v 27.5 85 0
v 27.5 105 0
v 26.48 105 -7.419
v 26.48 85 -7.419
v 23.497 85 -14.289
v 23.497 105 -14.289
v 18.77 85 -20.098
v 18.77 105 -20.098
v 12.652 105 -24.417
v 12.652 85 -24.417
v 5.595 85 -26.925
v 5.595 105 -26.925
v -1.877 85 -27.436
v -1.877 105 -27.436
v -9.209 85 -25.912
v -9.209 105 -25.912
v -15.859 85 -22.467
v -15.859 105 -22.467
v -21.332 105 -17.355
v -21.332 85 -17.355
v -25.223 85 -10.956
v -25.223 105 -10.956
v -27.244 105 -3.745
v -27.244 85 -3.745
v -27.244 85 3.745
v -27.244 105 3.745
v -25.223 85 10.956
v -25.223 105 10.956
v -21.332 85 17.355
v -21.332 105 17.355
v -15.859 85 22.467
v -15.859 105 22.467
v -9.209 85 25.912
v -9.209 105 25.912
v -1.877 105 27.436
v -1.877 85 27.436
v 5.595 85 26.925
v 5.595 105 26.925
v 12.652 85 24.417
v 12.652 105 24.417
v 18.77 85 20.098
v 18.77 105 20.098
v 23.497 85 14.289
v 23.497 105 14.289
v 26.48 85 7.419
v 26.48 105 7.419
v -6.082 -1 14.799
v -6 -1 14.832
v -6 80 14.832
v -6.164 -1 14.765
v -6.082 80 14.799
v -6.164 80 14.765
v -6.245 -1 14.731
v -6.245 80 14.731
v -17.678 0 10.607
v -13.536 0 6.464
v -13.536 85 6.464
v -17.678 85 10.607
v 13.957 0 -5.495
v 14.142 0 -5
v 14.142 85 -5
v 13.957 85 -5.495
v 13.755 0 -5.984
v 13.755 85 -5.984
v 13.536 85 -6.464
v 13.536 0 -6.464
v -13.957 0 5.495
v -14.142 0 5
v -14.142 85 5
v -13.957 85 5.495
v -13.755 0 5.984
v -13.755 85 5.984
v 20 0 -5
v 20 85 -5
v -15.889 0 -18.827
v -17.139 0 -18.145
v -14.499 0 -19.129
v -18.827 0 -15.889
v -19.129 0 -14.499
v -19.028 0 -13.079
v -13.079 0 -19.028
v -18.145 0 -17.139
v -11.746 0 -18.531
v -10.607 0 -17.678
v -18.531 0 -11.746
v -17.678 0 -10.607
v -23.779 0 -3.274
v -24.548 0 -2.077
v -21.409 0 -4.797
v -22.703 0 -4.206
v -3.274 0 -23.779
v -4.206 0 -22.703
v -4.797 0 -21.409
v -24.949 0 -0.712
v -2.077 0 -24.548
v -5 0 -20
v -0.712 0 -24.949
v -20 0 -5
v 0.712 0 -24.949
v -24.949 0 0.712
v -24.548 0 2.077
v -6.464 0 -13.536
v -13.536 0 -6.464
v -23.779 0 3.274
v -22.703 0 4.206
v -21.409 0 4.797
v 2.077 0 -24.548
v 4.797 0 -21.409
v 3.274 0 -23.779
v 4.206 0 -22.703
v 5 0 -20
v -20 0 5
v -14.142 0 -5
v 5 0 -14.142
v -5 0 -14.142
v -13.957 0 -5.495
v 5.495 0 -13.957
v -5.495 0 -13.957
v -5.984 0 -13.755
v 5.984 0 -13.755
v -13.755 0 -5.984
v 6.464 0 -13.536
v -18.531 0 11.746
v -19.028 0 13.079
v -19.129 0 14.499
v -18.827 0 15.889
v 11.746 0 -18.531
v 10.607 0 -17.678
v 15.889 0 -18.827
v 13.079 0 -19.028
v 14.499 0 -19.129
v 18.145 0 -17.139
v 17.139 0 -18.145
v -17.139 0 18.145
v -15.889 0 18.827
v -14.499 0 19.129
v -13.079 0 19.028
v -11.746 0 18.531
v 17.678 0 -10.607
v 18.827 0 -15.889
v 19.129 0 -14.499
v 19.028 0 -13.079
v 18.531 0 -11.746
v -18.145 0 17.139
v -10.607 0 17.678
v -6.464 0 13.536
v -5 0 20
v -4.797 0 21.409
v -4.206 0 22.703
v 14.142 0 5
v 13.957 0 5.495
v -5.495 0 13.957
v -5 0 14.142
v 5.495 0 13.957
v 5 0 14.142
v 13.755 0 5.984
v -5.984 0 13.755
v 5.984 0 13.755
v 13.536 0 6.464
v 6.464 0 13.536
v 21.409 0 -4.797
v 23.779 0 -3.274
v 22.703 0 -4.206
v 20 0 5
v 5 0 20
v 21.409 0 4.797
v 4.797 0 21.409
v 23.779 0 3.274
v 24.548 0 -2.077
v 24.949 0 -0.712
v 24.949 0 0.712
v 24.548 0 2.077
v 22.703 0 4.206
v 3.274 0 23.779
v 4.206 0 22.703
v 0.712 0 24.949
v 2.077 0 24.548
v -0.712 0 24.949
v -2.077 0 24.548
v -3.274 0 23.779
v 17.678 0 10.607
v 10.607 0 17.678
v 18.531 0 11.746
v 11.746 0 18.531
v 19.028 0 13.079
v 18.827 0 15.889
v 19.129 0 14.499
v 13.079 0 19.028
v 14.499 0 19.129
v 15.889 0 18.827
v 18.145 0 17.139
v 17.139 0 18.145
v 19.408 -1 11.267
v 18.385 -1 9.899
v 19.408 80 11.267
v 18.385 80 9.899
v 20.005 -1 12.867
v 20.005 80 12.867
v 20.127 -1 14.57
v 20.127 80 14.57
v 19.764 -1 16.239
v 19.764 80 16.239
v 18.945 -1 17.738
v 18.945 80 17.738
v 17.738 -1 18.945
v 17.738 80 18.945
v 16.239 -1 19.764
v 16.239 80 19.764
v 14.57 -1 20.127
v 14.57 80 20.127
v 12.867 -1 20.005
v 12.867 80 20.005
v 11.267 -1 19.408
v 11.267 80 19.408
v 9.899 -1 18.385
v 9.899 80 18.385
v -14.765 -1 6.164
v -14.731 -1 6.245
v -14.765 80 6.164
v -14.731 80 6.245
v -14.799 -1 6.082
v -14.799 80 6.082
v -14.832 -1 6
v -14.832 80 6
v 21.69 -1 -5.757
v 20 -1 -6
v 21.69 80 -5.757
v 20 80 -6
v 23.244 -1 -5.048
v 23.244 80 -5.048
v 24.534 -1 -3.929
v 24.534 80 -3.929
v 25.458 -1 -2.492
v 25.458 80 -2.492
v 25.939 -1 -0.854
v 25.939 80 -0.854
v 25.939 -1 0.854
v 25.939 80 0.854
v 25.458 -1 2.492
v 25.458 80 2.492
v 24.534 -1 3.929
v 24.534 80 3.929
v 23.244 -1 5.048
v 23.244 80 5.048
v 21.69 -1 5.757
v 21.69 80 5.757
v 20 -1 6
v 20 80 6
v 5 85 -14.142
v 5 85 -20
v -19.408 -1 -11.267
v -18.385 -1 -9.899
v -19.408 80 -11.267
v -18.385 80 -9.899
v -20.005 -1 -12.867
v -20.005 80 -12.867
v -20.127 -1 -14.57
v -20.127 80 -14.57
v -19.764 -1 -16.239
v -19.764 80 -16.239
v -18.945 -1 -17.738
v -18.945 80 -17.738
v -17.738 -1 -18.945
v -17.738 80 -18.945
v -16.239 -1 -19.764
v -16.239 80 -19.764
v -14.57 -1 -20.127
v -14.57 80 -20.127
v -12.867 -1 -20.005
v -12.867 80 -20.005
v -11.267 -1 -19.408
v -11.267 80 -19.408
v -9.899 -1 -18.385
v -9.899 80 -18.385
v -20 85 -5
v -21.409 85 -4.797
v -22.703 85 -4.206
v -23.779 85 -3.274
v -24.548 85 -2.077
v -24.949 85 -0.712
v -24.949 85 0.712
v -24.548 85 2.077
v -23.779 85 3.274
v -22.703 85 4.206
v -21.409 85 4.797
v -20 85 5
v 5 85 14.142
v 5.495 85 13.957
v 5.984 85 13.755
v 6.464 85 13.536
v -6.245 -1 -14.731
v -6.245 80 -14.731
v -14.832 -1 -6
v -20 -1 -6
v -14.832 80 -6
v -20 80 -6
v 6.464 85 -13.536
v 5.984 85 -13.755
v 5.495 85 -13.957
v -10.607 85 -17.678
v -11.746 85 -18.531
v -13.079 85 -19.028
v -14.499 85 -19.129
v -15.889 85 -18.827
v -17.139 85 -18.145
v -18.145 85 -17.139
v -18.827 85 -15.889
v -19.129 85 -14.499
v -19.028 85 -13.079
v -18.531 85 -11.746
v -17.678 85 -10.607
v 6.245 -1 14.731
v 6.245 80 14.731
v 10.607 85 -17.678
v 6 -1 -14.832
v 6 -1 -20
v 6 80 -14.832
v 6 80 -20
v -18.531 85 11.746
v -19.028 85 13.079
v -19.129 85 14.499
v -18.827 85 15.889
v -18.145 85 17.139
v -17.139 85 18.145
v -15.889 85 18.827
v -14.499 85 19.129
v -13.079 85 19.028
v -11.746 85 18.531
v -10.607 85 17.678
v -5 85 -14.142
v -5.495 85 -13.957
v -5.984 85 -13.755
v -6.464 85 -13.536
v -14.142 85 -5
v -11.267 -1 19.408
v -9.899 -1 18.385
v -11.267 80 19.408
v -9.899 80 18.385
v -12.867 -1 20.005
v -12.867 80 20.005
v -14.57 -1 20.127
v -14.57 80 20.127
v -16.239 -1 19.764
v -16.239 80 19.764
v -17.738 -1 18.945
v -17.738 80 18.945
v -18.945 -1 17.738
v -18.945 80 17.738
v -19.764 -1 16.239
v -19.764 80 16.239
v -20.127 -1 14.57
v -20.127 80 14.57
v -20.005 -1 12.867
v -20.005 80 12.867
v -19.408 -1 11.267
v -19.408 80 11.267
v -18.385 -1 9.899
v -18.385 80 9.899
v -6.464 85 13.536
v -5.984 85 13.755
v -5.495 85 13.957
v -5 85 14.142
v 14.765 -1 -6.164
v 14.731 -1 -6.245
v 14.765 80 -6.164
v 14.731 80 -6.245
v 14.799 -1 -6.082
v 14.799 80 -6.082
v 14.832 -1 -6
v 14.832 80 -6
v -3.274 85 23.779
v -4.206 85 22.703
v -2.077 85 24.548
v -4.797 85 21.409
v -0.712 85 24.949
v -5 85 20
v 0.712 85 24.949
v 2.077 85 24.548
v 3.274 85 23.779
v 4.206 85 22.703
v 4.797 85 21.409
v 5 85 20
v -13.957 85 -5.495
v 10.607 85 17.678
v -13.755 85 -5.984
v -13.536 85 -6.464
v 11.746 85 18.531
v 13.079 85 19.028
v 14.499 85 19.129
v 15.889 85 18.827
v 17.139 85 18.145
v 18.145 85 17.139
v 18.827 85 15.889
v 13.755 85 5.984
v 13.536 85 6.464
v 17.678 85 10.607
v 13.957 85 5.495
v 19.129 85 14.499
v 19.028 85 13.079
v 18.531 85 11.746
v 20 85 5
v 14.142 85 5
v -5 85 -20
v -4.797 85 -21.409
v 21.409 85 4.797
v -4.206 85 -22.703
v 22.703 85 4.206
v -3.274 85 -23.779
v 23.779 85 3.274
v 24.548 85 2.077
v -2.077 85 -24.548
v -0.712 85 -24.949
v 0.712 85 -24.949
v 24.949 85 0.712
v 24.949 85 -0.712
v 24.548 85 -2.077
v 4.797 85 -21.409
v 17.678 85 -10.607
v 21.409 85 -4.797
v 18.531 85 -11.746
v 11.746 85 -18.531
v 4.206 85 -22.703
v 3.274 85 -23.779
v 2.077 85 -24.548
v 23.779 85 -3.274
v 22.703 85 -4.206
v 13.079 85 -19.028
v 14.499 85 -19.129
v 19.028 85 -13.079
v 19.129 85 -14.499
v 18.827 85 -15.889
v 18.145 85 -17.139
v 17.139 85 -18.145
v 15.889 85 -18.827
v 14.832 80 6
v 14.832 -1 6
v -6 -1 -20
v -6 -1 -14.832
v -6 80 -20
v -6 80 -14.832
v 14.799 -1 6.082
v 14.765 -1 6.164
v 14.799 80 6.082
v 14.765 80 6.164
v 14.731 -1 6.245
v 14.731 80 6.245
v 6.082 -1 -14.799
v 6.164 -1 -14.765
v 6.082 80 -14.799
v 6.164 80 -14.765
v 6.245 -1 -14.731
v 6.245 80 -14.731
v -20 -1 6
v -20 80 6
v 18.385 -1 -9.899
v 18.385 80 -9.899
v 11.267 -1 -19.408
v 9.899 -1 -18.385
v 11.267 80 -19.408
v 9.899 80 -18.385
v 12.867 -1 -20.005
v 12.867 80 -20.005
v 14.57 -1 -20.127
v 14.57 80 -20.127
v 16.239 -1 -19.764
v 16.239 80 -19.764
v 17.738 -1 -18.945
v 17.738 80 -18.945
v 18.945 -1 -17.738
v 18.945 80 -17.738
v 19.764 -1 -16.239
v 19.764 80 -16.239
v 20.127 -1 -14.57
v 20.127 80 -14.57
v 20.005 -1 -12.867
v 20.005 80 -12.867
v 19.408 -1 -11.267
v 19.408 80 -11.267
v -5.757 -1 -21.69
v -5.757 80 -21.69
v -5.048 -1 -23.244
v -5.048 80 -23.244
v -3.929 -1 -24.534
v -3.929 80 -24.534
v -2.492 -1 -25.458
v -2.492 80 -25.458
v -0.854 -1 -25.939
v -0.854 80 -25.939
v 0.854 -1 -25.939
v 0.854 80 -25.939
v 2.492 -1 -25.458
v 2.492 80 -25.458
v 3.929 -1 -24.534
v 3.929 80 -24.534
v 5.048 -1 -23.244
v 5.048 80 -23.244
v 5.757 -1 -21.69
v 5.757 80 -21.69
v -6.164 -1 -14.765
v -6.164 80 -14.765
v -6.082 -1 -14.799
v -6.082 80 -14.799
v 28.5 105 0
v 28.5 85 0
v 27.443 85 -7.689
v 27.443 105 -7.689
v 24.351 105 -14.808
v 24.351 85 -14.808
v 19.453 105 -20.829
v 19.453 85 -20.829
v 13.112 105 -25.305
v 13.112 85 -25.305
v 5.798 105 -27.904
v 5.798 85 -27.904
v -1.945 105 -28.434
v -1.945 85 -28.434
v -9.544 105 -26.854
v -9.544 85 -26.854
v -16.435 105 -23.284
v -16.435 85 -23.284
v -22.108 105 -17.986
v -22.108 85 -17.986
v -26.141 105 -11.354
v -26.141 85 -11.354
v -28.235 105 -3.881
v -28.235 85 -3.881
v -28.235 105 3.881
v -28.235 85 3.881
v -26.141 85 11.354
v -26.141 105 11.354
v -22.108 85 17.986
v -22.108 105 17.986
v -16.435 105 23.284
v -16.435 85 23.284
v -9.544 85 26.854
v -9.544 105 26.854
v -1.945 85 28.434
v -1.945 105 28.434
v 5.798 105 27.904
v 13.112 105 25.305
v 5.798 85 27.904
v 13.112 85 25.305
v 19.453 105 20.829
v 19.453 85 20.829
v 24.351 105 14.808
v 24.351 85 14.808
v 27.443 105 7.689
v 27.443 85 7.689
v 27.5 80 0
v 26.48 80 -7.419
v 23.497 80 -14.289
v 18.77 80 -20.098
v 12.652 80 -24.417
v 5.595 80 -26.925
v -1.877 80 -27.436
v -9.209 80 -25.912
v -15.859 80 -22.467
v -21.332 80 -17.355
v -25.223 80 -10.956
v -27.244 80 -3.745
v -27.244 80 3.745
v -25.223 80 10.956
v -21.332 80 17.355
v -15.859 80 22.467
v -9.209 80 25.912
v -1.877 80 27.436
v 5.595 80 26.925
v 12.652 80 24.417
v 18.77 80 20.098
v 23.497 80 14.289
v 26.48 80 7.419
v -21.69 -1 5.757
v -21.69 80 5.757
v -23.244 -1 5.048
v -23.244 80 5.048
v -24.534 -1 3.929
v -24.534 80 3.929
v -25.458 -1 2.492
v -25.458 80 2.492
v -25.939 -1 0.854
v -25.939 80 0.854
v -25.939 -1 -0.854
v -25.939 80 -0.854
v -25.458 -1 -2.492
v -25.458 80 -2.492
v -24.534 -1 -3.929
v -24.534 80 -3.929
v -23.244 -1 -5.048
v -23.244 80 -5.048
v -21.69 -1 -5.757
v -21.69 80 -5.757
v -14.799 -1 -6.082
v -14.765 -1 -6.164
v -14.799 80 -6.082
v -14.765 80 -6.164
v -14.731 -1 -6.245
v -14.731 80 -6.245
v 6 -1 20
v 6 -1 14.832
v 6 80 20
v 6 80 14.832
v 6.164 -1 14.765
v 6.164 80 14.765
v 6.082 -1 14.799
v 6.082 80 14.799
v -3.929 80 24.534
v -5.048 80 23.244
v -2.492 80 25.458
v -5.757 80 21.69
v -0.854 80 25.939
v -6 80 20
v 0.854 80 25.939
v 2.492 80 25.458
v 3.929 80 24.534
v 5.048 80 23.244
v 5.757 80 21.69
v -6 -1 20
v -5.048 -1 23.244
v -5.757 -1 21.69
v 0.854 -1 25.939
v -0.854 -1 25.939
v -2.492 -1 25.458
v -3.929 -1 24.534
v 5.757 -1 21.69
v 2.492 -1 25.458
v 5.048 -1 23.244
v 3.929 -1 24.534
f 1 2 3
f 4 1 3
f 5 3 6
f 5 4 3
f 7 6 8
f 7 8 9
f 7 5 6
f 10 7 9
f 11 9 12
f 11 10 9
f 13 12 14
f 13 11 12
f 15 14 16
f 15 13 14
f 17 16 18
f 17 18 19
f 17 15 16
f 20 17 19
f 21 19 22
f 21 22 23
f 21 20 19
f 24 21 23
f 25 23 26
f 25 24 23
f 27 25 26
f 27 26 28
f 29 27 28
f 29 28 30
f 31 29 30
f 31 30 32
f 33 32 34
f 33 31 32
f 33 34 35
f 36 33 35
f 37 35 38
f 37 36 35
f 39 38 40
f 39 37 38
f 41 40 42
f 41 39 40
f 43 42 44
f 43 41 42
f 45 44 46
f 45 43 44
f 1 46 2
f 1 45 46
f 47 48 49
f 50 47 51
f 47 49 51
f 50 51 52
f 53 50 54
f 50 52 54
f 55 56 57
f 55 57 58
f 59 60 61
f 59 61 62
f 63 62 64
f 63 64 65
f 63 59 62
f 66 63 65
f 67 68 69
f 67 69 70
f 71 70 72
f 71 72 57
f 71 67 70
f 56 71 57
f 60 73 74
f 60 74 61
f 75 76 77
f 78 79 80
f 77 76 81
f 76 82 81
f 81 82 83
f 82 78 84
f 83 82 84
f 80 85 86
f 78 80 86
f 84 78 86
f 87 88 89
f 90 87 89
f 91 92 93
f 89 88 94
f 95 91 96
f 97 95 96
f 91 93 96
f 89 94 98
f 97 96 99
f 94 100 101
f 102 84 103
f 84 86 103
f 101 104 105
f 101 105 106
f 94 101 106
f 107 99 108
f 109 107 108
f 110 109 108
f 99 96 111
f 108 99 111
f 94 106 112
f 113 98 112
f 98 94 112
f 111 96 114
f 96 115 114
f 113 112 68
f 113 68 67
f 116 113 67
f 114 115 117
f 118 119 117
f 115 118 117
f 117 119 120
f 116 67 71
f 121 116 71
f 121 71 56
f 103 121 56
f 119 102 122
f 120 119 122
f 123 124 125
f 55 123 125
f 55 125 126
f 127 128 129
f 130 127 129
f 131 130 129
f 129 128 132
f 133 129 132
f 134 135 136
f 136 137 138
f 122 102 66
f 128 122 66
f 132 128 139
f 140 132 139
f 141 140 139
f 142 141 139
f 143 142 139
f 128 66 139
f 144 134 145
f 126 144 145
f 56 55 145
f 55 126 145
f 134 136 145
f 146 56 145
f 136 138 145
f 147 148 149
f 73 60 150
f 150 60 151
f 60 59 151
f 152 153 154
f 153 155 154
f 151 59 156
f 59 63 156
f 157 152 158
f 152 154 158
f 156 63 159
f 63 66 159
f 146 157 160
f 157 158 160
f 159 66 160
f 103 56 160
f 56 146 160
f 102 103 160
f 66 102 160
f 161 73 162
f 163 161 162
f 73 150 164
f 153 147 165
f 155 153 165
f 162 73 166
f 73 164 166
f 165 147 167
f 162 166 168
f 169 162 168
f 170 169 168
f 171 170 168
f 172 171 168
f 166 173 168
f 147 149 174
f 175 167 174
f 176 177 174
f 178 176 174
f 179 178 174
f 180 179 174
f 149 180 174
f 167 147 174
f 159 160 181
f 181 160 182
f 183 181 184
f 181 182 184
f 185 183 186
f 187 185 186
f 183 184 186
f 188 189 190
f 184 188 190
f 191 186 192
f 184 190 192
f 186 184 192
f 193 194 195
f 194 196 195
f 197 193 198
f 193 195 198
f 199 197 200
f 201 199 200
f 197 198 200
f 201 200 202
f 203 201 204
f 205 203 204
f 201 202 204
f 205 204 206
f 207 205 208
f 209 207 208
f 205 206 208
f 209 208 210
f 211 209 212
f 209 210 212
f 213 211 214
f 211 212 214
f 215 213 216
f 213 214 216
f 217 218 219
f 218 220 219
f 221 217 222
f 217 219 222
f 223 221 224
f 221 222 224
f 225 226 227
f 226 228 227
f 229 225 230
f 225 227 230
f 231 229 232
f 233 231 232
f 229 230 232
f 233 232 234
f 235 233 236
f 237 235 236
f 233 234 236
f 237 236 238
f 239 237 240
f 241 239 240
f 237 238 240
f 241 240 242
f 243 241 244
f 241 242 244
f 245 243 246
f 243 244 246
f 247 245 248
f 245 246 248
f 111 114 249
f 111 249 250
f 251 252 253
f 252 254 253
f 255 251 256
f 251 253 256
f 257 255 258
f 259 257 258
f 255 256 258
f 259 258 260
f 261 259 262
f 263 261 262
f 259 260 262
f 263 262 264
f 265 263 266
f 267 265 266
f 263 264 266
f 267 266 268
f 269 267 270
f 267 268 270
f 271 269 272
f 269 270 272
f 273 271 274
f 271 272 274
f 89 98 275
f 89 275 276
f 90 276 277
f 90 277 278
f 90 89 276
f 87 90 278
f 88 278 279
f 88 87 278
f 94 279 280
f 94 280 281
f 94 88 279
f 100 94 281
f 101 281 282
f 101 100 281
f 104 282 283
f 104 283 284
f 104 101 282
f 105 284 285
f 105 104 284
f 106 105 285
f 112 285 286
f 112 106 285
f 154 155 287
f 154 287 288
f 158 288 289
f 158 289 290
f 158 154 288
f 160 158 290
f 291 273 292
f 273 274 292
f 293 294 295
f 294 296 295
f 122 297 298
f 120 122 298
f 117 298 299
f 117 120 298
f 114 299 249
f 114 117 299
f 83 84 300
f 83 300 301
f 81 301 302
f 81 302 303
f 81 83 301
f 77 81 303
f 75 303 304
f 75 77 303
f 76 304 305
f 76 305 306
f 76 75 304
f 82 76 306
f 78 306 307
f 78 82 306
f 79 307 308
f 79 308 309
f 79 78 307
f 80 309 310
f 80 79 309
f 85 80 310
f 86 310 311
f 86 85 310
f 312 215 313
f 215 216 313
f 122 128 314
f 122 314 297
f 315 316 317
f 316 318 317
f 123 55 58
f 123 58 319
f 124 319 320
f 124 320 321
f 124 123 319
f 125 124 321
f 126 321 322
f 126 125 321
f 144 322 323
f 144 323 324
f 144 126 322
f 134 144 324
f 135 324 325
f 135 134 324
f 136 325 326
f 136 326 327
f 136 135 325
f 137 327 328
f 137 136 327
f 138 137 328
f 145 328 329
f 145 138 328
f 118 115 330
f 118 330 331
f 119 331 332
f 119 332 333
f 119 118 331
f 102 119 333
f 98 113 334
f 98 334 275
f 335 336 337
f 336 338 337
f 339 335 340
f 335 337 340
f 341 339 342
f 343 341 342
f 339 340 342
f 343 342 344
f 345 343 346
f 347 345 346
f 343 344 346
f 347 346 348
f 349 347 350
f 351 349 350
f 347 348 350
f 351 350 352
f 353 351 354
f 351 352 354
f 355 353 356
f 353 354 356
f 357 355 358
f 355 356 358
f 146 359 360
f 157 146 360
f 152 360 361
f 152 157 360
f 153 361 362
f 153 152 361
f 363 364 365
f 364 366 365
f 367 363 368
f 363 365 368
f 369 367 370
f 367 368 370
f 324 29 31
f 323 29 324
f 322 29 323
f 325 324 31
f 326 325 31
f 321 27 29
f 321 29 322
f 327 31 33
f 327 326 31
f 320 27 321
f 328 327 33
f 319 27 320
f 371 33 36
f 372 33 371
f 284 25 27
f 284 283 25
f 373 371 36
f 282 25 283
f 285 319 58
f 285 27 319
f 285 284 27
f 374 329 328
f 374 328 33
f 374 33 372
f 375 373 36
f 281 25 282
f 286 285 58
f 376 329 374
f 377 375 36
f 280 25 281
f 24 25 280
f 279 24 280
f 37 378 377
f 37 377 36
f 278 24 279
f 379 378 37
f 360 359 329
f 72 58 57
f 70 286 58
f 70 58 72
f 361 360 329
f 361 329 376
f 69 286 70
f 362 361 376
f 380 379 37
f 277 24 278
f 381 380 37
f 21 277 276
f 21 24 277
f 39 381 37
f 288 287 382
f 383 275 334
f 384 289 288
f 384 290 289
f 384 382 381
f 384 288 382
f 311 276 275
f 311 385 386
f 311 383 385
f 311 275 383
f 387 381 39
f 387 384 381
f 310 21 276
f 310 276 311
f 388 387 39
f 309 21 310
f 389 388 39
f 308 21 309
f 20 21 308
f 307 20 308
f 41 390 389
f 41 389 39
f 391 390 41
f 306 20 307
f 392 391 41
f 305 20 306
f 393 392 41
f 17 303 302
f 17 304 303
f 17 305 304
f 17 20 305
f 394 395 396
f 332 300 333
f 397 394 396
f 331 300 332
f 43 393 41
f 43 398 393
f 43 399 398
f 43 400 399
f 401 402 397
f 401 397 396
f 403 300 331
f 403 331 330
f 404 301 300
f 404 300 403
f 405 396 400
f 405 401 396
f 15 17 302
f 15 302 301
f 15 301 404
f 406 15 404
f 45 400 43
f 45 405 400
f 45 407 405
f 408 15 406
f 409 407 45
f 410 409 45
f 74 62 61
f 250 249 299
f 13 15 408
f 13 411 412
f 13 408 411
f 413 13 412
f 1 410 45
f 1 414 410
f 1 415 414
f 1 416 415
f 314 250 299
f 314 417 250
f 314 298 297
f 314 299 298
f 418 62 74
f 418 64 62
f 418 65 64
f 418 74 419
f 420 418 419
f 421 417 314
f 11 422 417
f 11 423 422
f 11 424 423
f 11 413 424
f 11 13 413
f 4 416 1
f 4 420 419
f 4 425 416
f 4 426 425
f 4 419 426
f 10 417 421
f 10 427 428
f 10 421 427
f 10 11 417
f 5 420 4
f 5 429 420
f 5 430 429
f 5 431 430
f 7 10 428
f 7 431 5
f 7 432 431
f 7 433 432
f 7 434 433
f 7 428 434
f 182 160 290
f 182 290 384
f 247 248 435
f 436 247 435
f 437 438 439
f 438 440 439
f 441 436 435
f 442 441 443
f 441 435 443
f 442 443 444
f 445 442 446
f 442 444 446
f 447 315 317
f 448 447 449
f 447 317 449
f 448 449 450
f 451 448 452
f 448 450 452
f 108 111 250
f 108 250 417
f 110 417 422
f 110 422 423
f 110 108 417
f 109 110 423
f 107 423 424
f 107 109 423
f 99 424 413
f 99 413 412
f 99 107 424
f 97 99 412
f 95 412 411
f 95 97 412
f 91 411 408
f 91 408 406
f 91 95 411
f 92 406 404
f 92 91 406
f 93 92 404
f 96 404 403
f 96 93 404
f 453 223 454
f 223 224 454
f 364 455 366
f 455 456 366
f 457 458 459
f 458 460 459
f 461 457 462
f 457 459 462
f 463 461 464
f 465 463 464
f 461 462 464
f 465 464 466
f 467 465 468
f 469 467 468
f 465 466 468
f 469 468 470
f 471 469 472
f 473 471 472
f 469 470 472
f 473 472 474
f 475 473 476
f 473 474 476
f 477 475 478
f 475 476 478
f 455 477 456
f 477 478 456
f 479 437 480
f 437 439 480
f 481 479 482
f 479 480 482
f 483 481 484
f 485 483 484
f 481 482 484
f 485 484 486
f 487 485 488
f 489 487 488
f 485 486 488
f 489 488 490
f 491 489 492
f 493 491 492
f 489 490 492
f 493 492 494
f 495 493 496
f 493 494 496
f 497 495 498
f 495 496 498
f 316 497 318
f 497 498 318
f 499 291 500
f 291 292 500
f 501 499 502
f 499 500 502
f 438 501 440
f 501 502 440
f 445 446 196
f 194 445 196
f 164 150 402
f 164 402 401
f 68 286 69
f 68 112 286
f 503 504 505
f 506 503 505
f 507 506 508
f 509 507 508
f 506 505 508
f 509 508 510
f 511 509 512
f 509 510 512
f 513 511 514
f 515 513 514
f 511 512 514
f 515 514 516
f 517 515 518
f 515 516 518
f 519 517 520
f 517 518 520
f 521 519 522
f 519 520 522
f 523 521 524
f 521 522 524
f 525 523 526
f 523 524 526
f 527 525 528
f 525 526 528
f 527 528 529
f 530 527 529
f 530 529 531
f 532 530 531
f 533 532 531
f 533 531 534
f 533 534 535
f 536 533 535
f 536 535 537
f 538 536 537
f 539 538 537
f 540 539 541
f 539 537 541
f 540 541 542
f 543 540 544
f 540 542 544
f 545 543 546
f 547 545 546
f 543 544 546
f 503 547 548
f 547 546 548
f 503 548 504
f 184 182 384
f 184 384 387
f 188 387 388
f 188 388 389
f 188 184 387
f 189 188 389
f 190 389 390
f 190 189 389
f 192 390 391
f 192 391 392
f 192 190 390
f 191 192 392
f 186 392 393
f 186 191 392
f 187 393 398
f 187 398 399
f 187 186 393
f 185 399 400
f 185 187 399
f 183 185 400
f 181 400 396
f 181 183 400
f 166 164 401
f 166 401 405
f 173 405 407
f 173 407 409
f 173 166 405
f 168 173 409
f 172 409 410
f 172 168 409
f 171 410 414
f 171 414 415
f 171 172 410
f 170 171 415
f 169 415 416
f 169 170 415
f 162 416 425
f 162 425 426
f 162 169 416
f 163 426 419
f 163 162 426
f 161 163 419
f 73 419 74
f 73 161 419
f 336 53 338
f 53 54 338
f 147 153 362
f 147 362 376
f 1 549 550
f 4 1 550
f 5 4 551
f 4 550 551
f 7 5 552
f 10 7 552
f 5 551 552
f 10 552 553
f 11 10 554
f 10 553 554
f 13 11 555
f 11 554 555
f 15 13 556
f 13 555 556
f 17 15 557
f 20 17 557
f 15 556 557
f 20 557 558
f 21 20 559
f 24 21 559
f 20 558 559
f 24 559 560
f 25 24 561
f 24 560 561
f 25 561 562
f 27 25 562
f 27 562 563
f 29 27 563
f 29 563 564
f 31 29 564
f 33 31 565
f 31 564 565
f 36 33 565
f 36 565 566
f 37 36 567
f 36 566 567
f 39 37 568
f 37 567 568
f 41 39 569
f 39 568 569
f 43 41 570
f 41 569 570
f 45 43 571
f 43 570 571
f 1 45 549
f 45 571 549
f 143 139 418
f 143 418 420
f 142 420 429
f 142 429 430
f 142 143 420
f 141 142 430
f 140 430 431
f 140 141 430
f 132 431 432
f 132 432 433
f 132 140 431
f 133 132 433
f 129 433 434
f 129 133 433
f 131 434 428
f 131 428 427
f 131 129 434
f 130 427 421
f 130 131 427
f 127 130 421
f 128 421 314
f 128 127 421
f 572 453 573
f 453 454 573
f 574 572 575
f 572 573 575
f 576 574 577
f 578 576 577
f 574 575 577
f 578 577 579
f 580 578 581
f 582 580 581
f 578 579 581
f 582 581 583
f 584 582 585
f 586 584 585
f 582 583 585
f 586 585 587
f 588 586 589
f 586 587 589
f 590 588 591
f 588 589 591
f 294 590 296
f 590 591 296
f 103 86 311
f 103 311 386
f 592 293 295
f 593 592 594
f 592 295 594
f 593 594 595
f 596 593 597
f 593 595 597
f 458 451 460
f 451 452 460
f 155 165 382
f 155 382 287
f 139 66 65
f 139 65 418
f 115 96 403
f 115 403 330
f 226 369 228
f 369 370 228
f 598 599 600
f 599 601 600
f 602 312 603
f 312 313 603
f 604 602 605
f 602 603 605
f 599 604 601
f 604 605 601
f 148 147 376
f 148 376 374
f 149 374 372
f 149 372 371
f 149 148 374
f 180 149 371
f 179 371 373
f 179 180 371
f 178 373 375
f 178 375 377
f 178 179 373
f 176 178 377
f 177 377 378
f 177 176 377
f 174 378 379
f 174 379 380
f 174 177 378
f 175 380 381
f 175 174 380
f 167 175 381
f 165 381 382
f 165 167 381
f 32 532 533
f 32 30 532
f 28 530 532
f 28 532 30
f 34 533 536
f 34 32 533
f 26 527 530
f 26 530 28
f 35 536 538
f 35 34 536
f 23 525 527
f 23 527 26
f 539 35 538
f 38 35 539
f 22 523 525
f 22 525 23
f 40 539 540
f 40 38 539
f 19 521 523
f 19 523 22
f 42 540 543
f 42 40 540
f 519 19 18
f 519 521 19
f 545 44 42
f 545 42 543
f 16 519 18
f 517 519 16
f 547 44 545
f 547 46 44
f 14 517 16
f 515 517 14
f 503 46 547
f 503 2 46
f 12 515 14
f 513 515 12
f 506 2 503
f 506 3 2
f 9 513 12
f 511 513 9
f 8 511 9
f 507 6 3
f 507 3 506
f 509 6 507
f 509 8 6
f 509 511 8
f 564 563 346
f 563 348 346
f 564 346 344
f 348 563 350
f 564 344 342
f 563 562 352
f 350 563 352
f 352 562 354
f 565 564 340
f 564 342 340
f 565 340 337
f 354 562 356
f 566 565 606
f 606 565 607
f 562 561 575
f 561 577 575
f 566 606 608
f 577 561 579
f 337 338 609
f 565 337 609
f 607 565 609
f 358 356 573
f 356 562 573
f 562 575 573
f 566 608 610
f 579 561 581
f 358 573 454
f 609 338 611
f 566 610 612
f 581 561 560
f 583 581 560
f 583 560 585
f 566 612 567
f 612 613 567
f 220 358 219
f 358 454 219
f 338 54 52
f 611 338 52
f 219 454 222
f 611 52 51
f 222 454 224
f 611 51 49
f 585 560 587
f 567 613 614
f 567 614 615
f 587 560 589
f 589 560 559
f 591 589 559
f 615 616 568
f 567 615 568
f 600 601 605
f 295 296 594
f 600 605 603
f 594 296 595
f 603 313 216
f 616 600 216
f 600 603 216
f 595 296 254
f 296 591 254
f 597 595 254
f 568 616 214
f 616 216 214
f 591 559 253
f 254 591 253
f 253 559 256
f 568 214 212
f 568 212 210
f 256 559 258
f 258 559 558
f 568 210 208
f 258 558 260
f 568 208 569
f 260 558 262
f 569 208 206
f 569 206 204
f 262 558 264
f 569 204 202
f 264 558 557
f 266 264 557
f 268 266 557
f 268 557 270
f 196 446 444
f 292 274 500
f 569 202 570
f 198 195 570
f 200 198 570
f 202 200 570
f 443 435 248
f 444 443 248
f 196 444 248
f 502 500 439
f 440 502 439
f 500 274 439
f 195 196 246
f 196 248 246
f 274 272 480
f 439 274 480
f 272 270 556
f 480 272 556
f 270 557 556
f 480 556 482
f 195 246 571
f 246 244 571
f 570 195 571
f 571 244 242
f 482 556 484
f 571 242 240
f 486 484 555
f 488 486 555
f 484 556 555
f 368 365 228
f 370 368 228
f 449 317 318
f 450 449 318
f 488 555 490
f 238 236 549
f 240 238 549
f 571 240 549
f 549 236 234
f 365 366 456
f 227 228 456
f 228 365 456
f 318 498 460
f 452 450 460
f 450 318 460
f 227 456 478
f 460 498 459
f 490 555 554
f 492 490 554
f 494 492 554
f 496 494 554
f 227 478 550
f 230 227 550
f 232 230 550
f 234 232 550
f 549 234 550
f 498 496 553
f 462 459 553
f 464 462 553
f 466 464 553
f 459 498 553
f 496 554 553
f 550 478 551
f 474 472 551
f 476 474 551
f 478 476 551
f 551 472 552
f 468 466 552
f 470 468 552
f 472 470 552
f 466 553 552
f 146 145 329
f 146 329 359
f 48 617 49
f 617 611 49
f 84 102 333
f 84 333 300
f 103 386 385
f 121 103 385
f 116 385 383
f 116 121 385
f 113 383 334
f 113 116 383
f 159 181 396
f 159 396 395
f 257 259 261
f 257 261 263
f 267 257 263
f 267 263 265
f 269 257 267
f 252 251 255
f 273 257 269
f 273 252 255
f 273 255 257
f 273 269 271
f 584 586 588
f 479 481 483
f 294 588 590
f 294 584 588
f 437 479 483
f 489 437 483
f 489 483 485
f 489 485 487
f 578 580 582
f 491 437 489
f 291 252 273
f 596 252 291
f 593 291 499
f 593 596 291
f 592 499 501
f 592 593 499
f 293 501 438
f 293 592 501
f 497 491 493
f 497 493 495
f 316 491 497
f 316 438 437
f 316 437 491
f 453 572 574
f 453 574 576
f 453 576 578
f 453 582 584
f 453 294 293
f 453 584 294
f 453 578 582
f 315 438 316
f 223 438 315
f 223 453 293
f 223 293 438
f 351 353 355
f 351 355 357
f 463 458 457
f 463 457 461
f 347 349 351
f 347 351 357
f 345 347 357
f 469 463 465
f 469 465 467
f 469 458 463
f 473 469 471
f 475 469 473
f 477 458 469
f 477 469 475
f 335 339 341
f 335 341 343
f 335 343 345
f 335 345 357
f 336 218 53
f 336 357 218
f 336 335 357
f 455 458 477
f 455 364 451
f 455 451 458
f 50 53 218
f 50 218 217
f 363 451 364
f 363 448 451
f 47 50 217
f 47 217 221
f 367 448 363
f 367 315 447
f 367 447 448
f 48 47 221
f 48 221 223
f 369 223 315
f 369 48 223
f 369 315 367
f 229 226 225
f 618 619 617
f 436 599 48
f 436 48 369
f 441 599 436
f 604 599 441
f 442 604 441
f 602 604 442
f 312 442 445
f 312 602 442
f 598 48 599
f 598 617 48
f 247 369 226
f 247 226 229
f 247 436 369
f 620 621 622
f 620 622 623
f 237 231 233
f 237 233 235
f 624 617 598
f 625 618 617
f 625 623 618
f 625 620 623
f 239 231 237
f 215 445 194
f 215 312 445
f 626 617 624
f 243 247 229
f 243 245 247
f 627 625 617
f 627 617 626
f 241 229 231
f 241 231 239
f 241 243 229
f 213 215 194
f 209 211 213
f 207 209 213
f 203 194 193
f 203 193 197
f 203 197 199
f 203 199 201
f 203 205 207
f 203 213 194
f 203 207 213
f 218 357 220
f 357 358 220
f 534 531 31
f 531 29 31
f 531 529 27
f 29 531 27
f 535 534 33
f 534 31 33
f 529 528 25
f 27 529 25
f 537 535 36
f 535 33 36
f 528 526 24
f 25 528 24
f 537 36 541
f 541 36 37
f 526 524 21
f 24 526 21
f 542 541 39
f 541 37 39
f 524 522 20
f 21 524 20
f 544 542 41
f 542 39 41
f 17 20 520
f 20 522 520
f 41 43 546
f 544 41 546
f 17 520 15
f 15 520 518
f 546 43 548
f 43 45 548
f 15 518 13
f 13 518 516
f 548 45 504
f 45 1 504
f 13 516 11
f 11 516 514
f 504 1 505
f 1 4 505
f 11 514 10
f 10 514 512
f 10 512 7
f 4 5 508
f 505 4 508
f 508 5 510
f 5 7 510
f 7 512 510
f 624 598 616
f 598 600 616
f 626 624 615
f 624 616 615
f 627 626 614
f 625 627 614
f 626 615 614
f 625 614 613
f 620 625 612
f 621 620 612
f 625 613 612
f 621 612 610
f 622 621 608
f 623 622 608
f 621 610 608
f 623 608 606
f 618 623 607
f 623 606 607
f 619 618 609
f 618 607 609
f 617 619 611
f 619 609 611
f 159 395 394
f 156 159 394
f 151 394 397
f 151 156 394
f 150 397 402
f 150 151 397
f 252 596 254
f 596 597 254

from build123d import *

# Parameters (mm, degrees)
EXTRUDE_THIN1_DEPTH = 80
BOSS_EXTRUDE1_DEPTH = 1
SKETCH3_R           = 27.5
BOSS_EXTRUDE2_DEPTH = 5
SKETCH4_R           = 28.5
SKETCH4_R_2         = 27.5
EXTRUDE_THIN2_DEPTH = 20


with BuildPart() as part:
    # Sketch1 → Extrude-Thin1 (new body)
    with BuildSketch(Plane(origin=(0, 0, 0), x_dir=(1, 0, 0), z_dir=(0, 1, 0))):
        with BuildLine():
            Line((-6.245447795, -14.730729169), (-9.899494937, -18.384776311))
            ThreePointArc((-9.899494937, -18.384776311), (-18.384776311, -18.384776311), (-18.384776311, -9.899494937))
            Line((-18.384776311, -9.899494937), (-14.730729169, -6.245447795))
            ThreePointArc((-14.730729169, -6.245447795), (-14.78207252, -6.122934918), (-14.832396974, -6))
            Line((-14.832396974, -6), (-20, -6))
            ThreePointArc((-20, -6), (-26, 0), (-20, 6))
            Line((-20, 6), (-14.832396974, 6))
            ThreePointArc((-14.832396974, 6), (-14.78207252, 6.122934918), (-14.730729169, 6.245447795))
            Line((-14.730729169, 6.245447795), (-18.384776311, 9.899494937))
            ThreePointArc((-18.384776311, 9.899494937), (-18.384776311, 18.384776311), (-9.899494937, 18.384776311))
            Line((-9.899494937, 18.384776311), (-6.245447795, 14.730729169))
            ThreePointArc((-6.245447795, 14.730729169), (-6.122934918, 14.78207252), (-6, 14.832396974))
            Line((-6, 14.832396974), (-6, 20))
            ThreePointArc((-6, 20), (0, 26), (6, 20))
            Line((6, 20), (6, 14.832396974))
            ThreePointArc((6, 14.832396974), (6.122934918, 14.78207252), (6.245447795, 14.730729169))
            Line((6.245447795, 14.730729169), (9.899494937, 18.384776311))
            ThreePointArc((9.899494937, 18.384776311), (18.384776311, 18.384776311), (18.384776311, 9.899494937))
            Line((18.384776311, 9.899494937), (14.730729169, 6.245447795))
            ThreePointArc((14.730729169, 6.245447795), (14.78207252, 6.122934918), (14.832396974, 6))
            Line((14.832396974, 6), (20, 6))
            ThreePointArc((20, 6), (26, 0), (20, -6))
            Line((20, -6), (14.832396974, -6))
            ThreePointArc((14.832396974, -6), (14.78207252, -6.122934918), (14.730729169, -6.245447795))
            Line((14.730729169, -6.245447795), (18.384776311, -9.899494937))
            ThreePointArc((18.384776311, -9.899494937), (18.384776311, -18.384776311), (9.899494937, -18.384776311))
            Line((9.899494937, -18.384776311), (6.245447795, -14.730729169))
            ThreePointArc((6.245447795, -14.730729169), (6.122934918, -14.78207252), (6, -14.832396974))
            Line((6, -14.832396974), (6, -20))
            ThreePointArc((6, -20), (0, -26), (-6, -20))
            Line((-6, -20), (-6, -14.832396974))
            ThreePointArc((-6, -14.832396974), (-6.122934918, -14.78207252), (-6.245447795, -14.730729169))
        make_face()
        with BuildLine():
            Line((-6.464466094, -13.535533906), (-10.606601718, -17.67766953))
            ThreePointArc((-10.606601718, -17.67766953), (-17.67766953, -17.67766953), (-17.67766953, -10.606601718))
            Line((-17.67766953, -10.606601718), (-13.535533906, -6.464466094))
            ThreePointArc((-13.535533906, -6.464466094), (-13.858192988, -5.740251485), (-14.142135624, -5))
            Line((-14.142135624, -5), (-20, -5))
            ThreePointArc((-20, -5), (-25, 0), (-20, 5))
            Line((-20, 5), (-14.142135624, 5))
            ThreePointArc((-14.142135624, 5), (-13.858192988, 5.740251485), (-13.535533906, 6.464466094))
            Line((-13.535533906, 6.464466094), (-17.67766953, 10.606601718))
            ThreePointArc((-17.67766953, 10.606601718), (-17.67766953, 17.67766953), (-10.606601718, 17.67766953))
            Line((-10.606601718, 17.67766953), (-6.464466094, 13.535533906))
            ThreePointArc((-6.464466094, 13.535533906), (-5.740251485, 13.858192988), (-5, 14.142135624))
            Line((-5, 14.142135624), (-5, 20))
            ThreePointArc((-5, 20), (0, 25), (5, 20))
            Line((5, 20), (5, 14.142135624))
            ThreePointArc((5, 14.142135624), (5.740251485, 13.858192988), (6.464466094, 13.535533906))
            Line((6.464466094, 13.535533906), (10.606601718, 17.67766953))
            ThreePointArc((10.606601718, 17.67766953), (17.67766953, 17.67766953), (17.67766953, 10.606601718))
            Line((17.67766953, 10.606601718), (13.535533906, 6.464466094))
            ThreePointArc((13.535533906, 6.464466094), (13.858192988, 5.740251485), (14.142135624, 5))
            Line((14.142135624, 5), (20, 5))
            ThreePointArc((20, 5), (25, 0), (20, -5))
            Line((20, -5), (14.142135624, -5))
            ThreePointArc((14.142135624, -5), (13.858192988, -5.740251485), (13.535533906, -6.464466094))
            Line((13.535533906, -6.464466094), (17.67766953, -10.606601718))
            ThreePointArc((17.67766953, -10.606601718), (17.67766953, -17.67766953), (10.606601718, -17.67766953))
            Line((10.606601718, -17.67766953), (6.464466094, -13.535533906))
            ThreePointArc((6.464466094, -13.535533906), (5.740251485, -13.858192988), (5, -14.142135624))
            Line((5, -14.142135624), (5, -20))
            ThreePointArc((5, -20), (0, -25), (-5, -20))
            Line((-5, -20), (-5, -14.142135624))
            ThreePointArc((-5, -14.142135624), (-5.740251485, -13.858192988), (-6.464466094, -13.535533906))
        make_face(mode=Mode.SUBTRACT)
    extrude(amount=EXTRUDE_THIN1_DEPTH)

    # Sketch2 → Boss-Extrude1 (add)
    with BuildSketch(Plane.XZ):
        with BuildLine():
            Line((14.730729169, 6.245447795), (18.384776311, 9.899494937))
            ThreePointArc((18.384776311, 9.899494937), (18.384776311, 18.384776311), (9.899494937, 18.384776311))
            Line((9.899494937, 18.384776311), (6.245447795, 14.730729169))
            ThreePointArc((6.245447795, 14.730729169), (6.122934918, 14.78207252), (6, 14.832396974))
            Line((6, 14.832396974), (6, 20))
            ThreePointArc((6, 20), (0, 26), (-6, 20))
            Line((-6, 20), (-6, 14.832396974))
            ThreePointArc((-6, 14.832396974), (-6.122934918, 14.78207252), (-6.245447795, 14.730729169))
            Line((-6.245447795, 14.730729169), (-9.899494937, 18.384776311))
            ThreePointArc((-9.899494937, 18.384776311), (-18.384776311, 18.384776311), (-18.384776311, 9.899494937))
            Line((-18.384776311, 9.899494937), (-14.730729169, 6.245447795))
            ThreePointArc((-14.730729169, 6.245447795), (-14.78207252, 6.122934918), (-14.832396974, 6))
            Line((-14.832396974, 6), (-20, 6))
            ThreePointArc((-20, 6), (-26, 0), (-20, -6))
            Line((-20, -6), (-14.832396974, -6))
            ThreePointArc((-14.832396974, -6), (-14.78207252, -6.122934918), (-14.730729169, -6.245447795))
            Line((-14.730729169, -6.245447795), (-18.384776311, -9.899494937))
            ThreePointArc((-18.384776311, -9.899494937), (-18.384776311, -18.384776311), (-9.899494937, -18.384776311))
            Line((-9.899494937, -18.384776311), (-6.245447795, -14.730729169))
            ThreePointArc((-6.245447795, -14.730729169), (-6.122934918, -14.78207252), (-6, -14.832396974))
            Line((-6, -14.832396974), (-6, -20))
            ThreePointArc((-6, -20), (0, -26), (6, -20))
            Line((6, -20), (6, -14.832396974))
            ThreePointArc((6, -14.832396974), (6.122934918, -14.78207252), (6.245447795, -14.730729169))
            Line((6.245447795, -14.730729169), (9.899494937, -18.384776311))
            ThreePointArc((9.899494937, -18.384776311), (18.384776311, -18.384776311), (18.384776311, -9.899494937))
            Line((18.384776311, -9.899494937), (14.730729169, -6.245447795))
            ThreePointArc((14.730729169, -6.245447795), (14.78207252, -6.122934918), (14.832396974, -6))
            Line((14.832396974, -6), (20, -6))
            ThreePointArc((20, -6), (26, 0), (20, 6))
            Line((20, 6), (14.832396974, 6))
            ThreePointArc((14.832396974, 6), (14.78207252, 6.122934918), (14.730729169, 6.245447795))
        make_face()
    extrude(amount=BOSS_EXTRUDE1_DEPTH)

    # Sketch3 → Boss-Extrude2 (add)
    with BuildSketch(Plane(origin=(0, 80, 0), x_dir=(1, 0, 0), z_dir=(0, 1, 0))):
        Circle(SKETCH3_R)
        with BuildLine():
            Line((-20, -5), (-14.142135624, -5))
            ThreePointArc((-14.142135624, -5), (-13.858192988, -5.740251485), (-13.535533906, -6.464466094))
            Line((-13.535533906, -6.464466094), (-17.67766953, -10.606601718))
            ThreePointArc((-17.67766953, -10.606601718), (-17.67766953, -17.67766953), (-10.606601718, -17.67766953))
            Line((-10.606601718, -17.67766953), (-6.464466094, -13.535533906))
            ThreePointArc((-6.464466094, -13.535533906), (-5.740251485, -13.858192988), (-5, -14.142135624))
            Line((-5, -14.142135624), (-5, -20))
            ThreePointArc((-5, -20), (0, -25), (5, -20))
            Line((5, -20), (5, -14.142135624))
            ThreePointArc((5, -14.142135624), (5.740251485, -13.858192988), (6.464466094, -13.535533906))
            Line((6.464466094, -13.535533906), (10.606601718, -17.67766953))
            ThreePointArc((10.606601718, -17.67766953), (17.67766953, -17.67766953), (17.67766953, -10.606601718))
            Line((17.67766953, -10.606601718), (13.535533906, -6.464466094))
            ThreePointArc((13.535533906, -6.464466094), (13.858192988, -5.740251485), (14.142135624, -5))
            Line((14.142135624, -5), (20, -5))
            ThreePointArc((20, -5), (25, 0), (20, 5))
            Line((20, 5), (14.142135624, 5))
            ThreePointArc((14.142135624, 5), (13.858192988, 5.740251485), (13.535533906, 6.464466094))
            Line((13.535533906, 6.464466094), (17.67766953, 10.606601718))
            ThreePointArc((17.67766953, 10.606601718), (17.67766953, 17.67766953), (10.606601718, 17.67766953))
            Line((10.606601718, 17.67766953), (6.464466094, 13.535533906))
            ThreePointArc((6.464466094, 13.535533906), (5.740251485, 13.858192988), (5, 14.142135624))
            Line((5, 14.142135624), (5, 20))
            ThreePointArc((5, 20), (0, 25), (-5, 20))
            Line((-5, 20), (-5, 14.142135624))
            ThreePointArc((-5, 14.142135624), (-5.740251485, 13.858192988), (-6.464466094, 13.535533906))
            Line((-6.464466094, 13.535533906), (-10.606601718, 17.67766953))
            ThreePointArc((-10.606601718, 17.67766953), (-17.67766953, 17.67766953), (-17.67766953, 10.606601718))
            Line((-17.67766953, 10.606601718), (-13.535533906, 6.464466094))
            ThreePointArc((-13.535533906, 6.464466094), (-13.858192988, 5.740251485), (-14.142135624, 5))
            Line((-14.142135624, 5), (-20, 5))
            ThreePointArc((-20, 5), (-25, 0), (-20, -5))
        make_face(mode=Mode.SUBTRACT)
    extrude(amount=BOSS_EXTRUDE2_DEPTH)


with BuildPart() as body_2:
    # Sketch4 → Extrude-Thin2 (new body)
    with BuildSketch(Plane(origin=(0, 85, 0), x_dir=(1, 0, 0), z_dir=(0, 1, 0))):
        Circle(SKETCH4_R)
        Circle(SKETCH4_R_2, mode=Mode.SUBTRACT)
    extrude(amount=EXTRUDE_THIN2_DEPTH)


solid = Compound([part.part, body_2.part])
